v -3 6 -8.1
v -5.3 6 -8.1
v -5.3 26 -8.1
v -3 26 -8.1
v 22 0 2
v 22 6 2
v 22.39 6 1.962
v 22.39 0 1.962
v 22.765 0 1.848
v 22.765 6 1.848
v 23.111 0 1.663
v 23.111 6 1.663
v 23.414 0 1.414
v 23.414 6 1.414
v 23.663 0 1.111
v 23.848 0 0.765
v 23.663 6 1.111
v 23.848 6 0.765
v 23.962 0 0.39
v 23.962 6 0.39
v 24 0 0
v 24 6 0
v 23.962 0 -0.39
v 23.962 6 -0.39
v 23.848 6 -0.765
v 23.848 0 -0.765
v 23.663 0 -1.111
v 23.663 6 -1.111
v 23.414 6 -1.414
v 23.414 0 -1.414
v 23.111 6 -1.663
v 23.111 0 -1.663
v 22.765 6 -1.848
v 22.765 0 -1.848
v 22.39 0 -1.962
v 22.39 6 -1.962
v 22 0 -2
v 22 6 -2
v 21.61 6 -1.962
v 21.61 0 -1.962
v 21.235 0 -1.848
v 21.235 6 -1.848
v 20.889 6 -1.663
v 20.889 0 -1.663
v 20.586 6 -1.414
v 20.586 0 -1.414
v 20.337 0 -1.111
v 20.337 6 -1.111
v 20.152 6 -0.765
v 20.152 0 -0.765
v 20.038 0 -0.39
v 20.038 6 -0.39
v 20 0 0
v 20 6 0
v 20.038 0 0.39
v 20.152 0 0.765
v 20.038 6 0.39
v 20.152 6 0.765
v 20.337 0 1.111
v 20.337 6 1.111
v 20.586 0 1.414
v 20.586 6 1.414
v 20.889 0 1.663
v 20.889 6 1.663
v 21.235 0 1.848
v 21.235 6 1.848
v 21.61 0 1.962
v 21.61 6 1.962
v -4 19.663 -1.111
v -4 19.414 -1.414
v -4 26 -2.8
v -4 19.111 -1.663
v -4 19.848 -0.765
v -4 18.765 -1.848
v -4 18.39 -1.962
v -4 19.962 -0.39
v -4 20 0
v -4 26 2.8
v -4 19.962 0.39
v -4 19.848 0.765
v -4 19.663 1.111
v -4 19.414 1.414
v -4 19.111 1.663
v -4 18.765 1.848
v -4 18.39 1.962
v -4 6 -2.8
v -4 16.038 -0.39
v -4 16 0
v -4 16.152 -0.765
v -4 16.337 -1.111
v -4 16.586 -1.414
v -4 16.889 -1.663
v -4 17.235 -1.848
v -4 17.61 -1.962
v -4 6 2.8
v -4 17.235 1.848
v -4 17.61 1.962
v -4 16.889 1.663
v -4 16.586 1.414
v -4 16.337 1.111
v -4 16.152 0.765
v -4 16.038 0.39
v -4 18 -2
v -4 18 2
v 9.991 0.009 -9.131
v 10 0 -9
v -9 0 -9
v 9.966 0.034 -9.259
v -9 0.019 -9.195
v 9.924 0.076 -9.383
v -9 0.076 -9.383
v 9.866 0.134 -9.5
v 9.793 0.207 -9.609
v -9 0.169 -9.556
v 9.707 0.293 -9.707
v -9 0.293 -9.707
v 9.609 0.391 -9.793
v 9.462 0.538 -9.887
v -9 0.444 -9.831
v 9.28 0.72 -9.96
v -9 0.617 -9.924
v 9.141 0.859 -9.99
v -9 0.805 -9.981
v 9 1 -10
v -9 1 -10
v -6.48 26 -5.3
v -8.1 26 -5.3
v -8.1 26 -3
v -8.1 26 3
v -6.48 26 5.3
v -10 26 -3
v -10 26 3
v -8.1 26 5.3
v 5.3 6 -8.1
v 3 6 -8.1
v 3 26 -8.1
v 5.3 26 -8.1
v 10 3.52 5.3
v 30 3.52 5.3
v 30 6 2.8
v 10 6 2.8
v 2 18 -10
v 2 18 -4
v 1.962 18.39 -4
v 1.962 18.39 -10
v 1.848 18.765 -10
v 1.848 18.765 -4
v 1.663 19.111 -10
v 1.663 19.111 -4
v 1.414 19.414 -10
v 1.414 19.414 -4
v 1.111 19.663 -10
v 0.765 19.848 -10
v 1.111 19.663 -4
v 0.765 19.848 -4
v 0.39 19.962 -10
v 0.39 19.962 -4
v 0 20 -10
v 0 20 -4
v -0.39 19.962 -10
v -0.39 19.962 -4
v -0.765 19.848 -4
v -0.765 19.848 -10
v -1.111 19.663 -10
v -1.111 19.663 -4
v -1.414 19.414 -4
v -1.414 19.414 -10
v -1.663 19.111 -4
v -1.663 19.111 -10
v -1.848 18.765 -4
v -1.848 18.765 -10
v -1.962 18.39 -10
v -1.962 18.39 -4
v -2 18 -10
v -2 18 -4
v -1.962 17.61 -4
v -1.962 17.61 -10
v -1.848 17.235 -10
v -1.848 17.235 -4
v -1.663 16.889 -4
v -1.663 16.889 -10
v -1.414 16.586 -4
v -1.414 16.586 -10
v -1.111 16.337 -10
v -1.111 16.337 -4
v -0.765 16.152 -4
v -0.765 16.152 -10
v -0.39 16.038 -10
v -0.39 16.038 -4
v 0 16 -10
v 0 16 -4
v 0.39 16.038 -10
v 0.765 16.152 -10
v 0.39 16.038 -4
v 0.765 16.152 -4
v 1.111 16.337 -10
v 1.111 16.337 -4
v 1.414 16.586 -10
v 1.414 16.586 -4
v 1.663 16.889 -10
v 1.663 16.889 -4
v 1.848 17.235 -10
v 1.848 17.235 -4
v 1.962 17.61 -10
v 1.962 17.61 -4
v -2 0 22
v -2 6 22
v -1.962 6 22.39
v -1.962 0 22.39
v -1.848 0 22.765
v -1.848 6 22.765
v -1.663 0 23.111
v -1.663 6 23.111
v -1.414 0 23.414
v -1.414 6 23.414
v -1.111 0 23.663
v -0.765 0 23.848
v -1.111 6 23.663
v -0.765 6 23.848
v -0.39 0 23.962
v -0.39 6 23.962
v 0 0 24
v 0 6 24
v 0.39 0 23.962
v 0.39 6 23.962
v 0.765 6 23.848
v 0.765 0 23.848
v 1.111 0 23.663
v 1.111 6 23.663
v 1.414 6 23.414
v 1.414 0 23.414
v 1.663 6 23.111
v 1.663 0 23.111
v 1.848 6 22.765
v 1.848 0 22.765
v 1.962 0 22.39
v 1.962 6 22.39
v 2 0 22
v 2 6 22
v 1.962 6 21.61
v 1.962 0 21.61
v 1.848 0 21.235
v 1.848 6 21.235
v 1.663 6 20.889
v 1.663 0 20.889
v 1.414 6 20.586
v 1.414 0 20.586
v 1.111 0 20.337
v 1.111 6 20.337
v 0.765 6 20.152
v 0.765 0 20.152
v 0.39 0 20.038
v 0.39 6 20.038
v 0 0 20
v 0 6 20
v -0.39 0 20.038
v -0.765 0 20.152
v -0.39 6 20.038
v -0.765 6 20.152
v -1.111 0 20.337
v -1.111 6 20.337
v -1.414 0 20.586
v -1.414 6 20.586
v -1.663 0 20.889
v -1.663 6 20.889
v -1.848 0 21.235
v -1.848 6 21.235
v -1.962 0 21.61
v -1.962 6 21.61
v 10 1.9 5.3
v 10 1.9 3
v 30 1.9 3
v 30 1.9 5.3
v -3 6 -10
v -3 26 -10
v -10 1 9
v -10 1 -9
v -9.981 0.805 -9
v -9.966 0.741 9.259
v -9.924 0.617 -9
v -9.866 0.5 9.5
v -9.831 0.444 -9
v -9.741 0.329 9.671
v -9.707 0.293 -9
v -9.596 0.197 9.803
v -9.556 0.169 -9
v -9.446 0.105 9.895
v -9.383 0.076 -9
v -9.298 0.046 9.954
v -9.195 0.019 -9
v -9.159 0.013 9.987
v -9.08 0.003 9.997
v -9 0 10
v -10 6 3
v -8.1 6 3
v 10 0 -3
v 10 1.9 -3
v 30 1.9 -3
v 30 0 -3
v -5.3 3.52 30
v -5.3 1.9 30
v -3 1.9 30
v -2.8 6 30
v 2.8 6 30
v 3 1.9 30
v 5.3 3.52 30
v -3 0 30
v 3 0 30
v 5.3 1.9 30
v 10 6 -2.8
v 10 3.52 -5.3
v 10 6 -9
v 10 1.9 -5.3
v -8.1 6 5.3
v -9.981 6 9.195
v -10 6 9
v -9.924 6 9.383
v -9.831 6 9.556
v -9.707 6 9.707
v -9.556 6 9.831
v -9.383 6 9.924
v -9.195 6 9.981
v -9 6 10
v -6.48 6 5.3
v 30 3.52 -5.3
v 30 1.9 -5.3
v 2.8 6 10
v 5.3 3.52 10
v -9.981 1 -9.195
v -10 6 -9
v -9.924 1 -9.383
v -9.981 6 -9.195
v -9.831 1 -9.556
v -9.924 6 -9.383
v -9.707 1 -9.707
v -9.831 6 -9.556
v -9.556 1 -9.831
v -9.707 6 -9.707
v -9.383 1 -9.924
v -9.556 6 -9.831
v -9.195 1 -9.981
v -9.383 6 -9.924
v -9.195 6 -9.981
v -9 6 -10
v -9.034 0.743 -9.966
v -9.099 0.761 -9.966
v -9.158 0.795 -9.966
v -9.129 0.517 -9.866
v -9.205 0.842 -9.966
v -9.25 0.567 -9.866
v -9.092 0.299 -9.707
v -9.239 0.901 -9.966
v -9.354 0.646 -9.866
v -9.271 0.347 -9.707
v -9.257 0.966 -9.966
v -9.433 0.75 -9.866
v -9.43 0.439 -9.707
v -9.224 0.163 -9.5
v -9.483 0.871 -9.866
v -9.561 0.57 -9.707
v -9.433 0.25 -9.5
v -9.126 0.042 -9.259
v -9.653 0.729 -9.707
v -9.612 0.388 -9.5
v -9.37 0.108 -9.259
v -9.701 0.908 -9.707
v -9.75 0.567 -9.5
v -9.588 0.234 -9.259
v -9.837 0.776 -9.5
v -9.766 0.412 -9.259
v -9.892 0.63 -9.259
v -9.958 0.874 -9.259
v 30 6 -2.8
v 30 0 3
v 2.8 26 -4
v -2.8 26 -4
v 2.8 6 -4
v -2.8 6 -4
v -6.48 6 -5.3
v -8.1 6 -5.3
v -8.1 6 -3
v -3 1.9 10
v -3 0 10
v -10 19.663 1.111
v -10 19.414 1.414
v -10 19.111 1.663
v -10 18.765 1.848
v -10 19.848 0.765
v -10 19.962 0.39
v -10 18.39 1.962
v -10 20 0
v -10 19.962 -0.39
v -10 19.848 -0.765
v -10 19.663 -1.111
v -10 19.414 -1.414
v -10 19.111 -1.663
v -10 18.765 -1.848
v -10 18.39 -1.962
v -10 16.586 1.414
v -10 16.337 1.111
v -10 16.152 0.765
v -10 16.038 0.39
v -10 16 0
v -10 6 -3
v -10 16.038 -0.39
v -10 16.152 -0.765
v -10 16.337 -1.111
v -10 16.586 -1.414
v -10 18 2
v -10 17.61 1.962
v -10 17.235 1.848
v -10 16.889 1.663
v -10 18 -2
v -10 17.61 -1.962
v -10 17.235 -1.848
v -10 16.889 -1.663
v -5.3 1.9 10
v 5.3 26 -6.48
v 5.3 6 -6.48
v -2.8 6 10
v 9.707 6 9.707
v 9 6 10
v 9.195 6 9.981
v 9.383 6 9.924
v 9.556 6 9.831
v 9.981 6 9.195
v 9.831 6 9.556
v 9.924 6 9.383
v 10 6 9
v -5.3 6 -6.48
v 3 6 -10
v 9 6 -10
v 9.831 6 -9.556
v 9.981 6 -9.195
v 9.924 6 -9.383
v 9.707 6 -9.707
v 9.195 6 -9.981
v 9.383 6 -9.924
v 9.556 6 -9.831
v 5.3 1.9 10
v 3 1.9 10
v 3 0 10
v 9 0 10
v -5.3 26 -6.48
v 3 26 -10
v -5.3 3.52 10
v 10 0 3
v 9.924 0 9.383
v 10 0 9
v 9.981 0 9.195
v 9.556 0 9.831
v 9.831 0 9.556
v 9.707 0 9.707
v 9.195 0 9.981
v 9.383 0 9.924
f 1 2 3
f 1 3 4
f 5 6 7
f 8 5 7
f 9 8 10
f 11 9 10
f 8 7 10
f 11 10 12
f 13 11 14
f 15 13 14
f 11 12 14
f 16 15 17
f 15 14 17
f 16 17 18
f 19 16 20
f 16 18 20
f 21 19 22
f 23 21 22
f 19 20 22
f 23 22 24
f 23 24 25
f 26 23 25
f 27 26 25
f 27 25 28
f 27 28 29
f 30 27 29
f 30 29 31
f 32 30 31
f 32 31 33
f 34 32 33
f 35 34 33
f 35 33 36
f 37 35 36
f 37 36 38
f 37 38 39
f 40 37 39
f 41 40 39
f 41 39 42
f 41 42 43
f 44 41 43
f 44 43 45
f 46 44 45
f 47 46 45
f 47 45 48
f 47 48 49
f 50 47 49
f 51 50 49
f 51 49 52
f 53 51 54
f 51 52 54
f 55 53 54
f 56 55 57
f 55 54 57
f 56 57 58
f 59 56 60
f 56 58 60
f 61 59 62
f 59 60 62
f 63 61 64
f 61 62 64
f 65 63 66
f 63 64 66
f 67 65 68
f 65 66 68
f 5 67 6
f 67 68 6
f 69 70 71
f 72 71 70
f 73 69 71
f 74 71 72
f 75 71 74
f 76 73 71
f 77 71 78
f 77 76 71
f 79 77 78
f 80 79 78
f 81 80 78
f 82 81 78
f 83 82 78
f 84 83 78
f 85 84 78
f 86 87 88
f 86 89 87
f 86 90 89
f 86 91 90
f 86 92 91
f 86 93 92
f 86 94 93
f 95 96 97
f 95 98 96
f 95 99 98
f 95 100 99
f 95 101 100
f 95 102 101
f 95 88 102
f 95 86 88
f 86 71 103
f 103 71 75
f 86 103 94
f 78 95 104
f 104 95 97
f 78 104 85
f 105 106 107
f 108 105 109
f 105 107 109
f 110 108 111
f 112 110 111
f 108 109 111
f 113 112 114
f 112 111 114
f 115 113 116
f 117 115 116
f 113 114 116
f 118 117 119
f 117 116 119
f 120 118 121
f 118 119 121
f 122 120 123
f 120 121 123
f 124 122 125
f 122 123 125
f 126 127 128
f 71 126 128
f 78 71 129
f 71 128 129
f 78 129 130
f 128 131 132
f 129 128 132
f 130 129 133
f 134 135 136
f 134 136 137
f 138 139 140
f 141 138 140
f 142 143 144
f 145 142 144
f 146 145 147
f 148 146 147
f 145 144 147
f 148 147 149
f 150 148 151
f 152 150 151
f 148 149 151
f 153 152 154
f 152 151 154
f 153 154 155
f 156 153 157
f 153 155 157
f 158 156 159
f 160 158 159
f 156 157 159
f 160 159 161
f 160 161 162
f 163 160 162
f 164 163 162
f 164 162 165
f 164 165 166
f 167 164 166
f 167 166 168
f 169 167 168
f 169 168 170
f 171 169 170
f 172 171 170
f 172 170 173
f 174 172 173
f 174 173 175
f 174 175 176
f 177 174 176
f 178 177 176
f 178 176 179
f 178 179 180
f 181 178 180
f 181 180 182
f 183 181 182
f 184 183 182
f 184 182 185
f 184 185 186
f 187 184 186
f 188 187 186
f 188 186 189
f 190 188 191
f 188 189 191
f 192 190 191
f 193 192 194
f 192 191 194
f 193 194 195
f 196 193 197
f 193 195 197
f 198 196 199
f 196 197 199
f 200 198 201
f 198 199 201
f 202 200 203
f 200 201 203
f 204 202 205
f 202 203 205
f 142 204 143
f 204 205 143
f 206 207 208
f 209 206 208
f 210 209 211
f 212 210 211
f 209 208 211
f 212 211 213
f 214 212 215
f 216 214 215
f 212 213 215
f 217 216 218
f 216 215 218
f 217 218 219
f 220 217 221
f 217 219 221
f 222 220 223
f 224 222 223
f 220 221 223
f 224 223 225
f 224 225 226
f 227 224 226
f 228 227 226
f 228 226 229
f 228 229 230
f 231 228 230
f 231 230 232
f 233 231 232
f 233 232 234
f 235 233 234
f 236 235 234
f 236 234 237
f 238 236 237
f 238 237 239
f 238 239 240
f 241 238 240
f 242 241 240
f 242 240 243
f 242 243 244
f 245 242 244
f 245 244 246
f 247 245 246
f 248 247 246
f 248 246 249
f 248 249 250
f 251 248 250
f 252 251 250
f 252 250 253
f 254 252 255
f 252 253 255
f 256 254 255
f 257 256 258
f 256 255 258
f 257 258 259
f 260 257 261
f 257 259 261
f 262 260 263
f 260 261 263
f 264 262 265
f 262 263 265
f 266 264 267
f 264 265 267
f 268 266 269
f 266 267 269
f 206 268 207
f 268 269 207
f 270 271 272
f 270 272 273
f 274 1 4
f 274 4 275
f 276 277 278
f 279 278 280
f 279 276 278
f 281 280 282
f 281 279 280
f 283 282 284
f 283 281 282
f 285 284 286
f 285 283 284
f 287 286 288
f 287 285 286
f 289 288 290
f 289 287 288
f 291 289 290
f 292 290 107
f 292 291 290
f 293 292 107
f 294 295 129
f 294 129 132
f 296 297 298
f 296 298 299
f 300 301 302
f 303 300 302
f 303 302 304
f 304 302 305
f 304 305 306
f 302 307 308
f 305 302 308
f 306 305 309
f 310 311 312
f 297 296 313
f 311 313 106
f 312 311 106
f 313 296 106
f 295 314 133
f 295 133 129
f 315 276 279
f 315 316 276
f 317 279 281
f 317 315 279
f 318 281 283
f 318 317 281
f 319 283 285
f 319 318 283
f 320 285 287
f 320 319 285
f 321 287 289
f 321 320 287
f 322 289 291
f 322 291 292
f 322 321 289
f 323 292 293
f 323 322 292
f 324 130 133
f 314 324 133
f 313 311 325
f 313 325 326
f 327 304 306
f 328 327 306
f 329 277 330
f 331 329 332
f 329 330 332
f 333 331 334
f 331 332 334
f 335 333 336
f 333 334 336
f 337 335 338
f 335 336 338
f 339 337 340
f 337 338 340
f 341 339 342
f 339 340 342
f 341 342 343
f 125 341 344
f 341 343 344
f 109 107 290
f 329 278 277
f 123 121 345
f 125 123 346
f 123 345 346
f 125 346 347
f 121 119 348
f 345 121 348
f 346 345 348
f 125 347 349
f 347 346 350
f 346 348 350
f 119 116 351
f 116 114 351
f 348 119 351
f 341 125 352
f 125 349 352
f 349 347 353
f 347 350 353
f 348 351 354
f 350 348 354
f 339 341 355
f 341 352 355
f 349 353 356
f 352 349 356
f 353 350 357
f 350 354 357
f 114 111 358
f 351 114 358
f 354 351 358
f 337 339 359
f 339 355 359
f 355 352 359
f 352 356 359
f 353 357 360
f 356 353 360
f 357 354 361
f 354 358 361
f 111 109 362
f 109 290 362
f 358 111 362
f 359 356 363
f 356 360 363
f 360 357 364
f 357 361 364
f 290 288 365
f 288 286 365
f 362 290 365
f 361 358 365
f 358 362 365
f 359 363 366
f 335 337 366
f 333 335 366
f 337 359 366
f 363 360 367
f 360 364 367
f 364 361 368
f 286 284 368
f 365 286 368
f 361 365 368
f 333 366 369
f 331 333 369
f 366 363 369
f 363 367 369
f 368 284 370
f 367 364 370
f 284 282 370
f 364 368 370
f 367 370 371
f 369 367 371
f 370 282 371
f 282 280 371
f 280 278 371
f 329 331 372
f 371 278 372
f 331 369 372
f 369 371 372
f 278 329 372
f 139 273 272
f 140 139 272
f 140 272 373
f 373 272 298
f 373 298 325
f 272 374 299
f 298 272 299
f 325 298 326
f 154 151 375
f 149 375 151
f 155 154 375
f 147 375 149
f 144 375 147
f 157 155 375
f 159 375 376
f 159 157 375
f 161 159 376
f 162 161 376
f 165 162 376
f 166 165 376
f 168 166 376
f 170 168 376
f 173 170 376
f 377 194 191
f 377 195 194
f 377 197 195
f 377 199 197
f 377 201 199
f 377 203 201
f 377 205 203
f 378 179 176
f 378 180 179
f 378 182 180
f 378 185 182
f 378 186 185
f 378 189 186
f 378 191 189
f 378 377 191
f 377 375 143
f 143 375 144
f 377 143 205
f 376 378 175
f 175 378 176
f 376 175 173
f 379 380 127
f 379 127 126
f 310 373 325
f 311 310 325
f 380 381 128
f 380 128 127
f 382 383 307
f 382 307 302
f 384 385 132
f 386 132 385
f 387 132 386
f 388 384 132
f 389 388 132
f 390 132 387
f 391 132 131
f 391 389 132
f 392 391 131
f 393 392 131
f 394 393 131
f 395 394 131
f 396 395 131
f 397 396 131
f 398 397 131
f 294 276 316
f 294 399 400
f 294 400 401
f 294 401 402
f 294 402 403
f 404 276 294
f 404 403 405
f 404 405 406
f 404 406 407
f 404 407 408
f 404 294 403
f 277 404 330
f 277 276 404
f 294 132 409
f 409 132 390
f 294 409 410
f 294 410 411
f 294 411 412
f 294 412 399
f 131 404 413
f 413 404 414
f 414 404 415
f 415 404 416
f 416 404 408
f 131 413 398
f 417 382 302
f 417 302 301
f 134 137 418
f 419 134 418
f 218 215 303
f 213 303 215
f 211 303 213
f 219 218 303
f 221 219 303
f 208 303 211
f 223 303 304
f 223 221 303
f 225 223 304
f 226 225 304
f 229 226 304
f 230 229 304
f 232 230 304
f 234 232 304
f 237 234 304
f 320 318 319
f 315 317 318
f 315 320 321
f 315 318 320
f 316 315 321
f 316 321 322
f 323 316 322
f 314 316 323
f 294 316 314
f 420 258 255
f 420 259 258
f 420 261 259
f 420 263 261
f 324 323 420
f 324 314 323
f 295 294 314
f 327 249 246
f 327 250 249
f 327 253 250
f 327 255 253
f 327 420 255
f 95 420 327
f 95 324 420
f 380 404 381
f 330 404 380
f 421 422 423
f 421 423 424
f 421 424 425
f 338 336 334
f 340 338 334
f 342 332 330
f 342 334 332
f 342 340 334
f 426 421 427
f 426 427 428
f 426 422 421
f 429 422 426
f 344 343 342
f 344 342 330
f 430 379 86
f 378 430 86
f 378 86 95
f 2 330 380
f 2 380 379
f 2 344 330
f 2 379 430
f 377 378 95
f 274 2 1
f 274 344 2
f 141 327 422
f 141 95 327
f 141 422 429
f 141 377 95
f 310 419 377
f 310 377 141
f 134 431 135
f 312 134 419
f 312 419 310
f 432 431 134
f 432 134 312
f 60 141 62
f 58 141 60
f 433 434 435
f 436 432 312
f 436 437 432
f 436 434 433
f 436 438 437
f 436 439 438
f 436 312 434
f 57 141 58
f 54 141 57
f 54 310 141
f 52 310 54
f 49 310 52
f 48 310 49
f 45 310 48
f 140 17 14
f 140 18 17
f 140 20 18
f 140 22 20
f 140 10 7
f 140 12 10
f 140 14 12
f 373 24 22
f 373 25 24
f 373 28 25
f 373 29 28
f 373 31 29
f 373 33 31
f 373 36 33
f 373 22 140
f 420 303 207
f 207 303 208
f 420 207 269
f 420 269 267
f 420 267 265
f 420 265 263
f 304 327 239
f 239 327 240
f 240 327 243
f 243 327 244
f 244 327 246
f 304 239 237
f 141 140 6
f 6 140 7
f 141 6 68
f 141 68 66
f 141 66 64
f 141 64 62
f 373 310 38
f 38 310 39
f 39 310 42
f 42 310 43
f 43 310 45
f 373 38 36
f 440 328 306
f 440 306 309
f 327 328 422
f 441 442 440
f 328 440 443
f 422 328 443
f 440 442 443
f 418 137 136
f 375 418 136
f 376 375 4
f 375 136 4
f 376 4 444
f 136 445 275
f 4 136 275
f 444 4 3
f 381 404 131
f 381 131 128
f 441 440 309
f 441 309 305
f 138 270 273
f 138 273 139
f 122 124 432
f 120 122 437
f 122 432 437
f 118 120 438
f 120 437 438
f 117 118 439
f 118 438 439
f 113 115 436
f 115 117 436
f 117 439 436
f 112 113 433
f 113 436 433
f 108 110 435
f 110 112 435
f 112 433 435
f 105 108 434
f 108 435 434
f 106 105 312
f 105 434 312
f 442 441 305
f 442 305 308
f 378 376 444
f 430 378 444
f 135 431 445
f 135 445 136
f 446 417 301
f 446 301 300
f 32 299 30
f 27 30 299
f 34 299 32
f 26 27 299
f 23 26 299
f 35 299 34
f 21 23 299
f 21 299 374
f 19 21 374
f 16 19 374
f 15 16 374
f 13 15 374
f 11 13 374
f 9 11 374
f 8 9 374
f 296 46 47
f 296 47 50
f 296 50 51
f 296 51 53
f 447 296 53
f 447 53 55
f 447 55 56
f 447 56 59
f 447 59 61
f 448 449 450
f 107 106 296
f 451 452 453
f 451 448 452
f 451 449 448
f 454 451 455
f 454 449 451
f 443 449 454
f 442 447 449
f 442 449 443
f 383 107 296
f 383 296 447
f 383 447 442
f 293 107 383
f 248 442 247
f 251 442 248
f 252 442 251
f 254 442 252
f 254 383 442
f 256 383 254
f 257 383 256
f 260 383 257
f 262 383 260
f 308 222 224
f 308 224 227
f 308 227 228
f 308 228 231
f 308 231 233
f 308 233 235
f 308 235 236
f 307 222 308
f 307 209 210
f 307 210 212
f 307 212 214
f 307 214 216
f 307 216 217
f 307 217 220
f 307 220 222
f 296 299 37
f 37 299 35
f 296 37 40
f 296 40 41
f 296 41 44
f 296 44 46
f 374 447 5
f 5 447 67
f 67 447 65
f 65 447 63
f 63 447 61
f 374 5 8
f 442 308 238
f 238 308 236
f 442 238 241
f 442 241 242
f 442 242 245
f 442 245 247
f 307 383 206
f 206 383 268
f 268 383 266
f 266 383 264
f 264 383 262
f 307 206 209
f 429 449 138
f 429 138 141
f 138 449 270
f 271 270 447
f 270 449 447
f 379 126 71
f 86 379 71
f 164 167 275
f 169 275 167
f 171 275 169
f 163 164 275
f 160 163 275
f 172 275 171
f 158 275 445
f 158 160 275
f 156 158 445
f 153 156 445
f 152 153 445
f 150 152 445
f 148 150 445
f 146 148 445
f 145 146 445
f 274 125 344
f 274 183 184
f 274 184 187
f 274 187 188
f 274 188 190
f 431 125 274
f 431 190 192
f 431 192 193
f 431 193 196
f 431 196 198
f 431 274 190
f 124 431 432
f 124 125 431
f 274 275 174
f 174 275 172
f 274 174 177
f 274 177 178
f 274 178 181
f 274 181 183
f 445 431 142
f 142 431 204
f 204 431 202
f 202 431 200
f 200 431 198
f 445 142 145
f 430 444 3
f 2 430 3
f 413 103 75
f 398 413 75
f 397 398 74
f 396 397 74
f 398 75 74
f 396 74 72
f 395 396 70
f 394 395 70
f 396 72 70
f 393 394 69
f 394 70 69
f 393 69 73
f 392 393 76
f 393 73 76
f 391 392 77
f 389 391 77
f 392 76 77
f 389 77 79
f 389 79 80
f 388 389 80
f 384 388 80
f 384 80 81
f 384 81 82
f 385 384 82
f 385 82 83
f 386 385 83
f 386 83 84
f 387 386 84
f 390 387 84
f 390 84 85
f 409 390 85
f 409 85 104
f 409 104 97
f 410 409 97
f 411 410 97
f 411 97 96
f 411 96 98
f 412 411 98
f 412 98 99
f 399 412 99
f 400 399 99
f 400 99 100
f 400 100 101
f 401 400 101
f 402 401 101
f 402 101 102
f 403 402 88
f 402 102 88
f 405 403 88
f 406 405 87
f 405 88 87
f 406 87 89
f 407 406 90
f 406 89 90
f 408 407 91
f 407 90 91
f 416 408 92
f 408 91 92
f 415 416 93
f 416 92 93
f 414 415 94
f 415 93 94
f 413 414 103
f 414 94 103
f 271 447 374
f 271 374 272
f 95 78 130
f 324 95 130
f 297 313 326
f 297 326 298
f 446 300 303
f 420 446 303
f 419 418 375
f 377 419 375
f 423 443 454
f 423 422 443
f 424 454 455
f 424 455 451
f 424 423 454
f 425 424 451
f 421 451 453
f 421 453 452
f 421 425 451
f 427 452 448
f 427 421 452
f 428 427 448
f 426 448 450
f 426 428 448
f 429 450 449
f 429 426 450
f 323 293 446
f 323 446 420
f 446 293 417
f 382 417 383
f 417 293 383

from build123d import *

# Parameters (mm, degrees)
SKETCH1_W           = 20
SKETCH1_H           = 20
BOSS_EXTRUDE1_DEPTH = 6
BOSS_EXTRUDE2_DEPTH = 26
SKETCH5_R           = 2
CUT_EXTRUDE1_DEPTH  = 32.176914536
CIRPATTERN1_COUNT   = 2
CIRPATTERN1_ANGLE   = 90
BOSS_EXTRUDE3_DEPTH = 20
SKETCH6_R           = 2
CUT_EXTRUDE2_DEPTH  = 38.416573868
CIRPATTERN2_COUNT   = 2
CIRPATTERN2_ANGLE   = 90
FILLET1_R           = 1


with BuildPart() as part:
    # Sketch1 → Boss-Extrude1 (new body)
    with BuildSketch(Plane(origin=(0, 0, 0), x_dir=(1, 0, 0), z_dir=(0, 1, 0))):
        Rectangle(SKETCH1_W, SKETCH1_H)
    extrude(amount=BOSS_EXTRUDE1_DEPTH)

    # Sketch2 → Boss-Extrude2 (add)
    with BuildSketch(Plane(origin=(0, 0, 0), x_dir=(1, 0, 0), z_dir=(0, 1, 0))):
        Polygon((-3, 10), (3, 10), (3, 8.1), (5.3, 8.1), (5.3, 6.48), (2.8, 4), (-2.8, 4), (-5.3, 6.48), (-5.3, 8.1), (-3, 8.1), align=None)
    boss_extrude2 = extrude(amount=BOSS_EXTRUDE2_DEPTH)

    # Sketch5 → Cut-Extrude1 (cut, through all)
    with BuildSketch(Plane.XY.offset(-4)):
        with Locations((0, 18)):
            Circle(SKETCH5_R)
    cut_extrude1 = extrude(amount=-CUT_EXTRUDE1_DEPTH, mode=Mode.SUBTRACT)

    # CirPattern1: Boss-Extrude2, Cut-Extrude1 ×2 about axis
    cirpattern1_axis = Axis((0, 0, 0), (0, 1, 0))
    add([boss_extrude2.rotate(cirpattern1_axis, i * CIRPATTERN1_ANGLE / (CIRPATTERN1_COUNT - 1)) for i in range(1, CIRPATTERN1_COUNT)])
    add([cut_extrude1.rotate(cirpattern1_axis, i * CIRPATTERN1_ANGLE / (CIRPATTERN1_COUNT - 1)) for i in range(1, CIRPATTERN1_COUNT)], mode=Mode.SUBTRACT)

    # Sketch4 → Boss-Extrude3 (add)
    with BuildSketch(Plane(origin=(10, 6.045130441, 0.430052004), x_dir=(0, 0, 1), z_dir=(1, 0, 0))):
        Polygon((-3.430052004, 6.045130441), (2.569947996, 6.045130441), (2.569947996, 4.145130441), (4.869947996, 4.145130441), (4.869947996, 2.525130441), (2.369947996, 0.045130441), (-3.230052004, 0.045130441), (-5.730052004, 2.525130441), (-5.730052004, 4.145130441), (-3.430052004, 4.145130441), align=None)
    boss_extrude3 = extrude(amount=BOSS_EXTRUDE3_DEPTH)

    # Sketch6 → Cut-Extrude2 (cut, through all)
    with BuildSketch(Plane(origin=(0, 6, 0), x_dir=(1, 0, 0), z_dir=(0, 1, 0))):
        with Locations(Location((22, 0, 0), (0, 0, 270))):
            Circle(SKETCH6_R)
    cut_extrude2 = extrude(amount=-CUT_EXTRUDE2_DEPTH, mode=Mode.SUBTRACT)

    # CirPattern2: Boss-Extrude3, Cut-Extrude2 ×2 about axis
    cirpattern2_axis = Axis((0, 0, 0), (0, -1, 0))
    add([boss_extrude3.rotate(cirpattern2_axis, i * CIRPATTERN2_ANGLE / (CIRPATTERN2_COUNT - 1)) for i in range(1, CIRPATTERN2_COUNT)])
    add([cut_extrude2.rotate(cirpattern2_axis, i * CIRPATTERN2_ANGLE / (CIRPATTERN2_COUNT - 1)) for i in range(1, CIRPATTERN2_COUNT)], mode=Mode.SUBTRACT)

    # Fillet1
    fillet1_edges = [part.edges().sort_by_distance(p)[0] for p in [
        (-10, 0, 0),
        (0, 0, -10),
        (10, 3, -10),
        (10, 3, 10),
        (-10, 3, 10),
        (-10, 3, -10),
    ]]
    fillet(fillet1_edges, radius=FILLET1_R)


solid = part.part
